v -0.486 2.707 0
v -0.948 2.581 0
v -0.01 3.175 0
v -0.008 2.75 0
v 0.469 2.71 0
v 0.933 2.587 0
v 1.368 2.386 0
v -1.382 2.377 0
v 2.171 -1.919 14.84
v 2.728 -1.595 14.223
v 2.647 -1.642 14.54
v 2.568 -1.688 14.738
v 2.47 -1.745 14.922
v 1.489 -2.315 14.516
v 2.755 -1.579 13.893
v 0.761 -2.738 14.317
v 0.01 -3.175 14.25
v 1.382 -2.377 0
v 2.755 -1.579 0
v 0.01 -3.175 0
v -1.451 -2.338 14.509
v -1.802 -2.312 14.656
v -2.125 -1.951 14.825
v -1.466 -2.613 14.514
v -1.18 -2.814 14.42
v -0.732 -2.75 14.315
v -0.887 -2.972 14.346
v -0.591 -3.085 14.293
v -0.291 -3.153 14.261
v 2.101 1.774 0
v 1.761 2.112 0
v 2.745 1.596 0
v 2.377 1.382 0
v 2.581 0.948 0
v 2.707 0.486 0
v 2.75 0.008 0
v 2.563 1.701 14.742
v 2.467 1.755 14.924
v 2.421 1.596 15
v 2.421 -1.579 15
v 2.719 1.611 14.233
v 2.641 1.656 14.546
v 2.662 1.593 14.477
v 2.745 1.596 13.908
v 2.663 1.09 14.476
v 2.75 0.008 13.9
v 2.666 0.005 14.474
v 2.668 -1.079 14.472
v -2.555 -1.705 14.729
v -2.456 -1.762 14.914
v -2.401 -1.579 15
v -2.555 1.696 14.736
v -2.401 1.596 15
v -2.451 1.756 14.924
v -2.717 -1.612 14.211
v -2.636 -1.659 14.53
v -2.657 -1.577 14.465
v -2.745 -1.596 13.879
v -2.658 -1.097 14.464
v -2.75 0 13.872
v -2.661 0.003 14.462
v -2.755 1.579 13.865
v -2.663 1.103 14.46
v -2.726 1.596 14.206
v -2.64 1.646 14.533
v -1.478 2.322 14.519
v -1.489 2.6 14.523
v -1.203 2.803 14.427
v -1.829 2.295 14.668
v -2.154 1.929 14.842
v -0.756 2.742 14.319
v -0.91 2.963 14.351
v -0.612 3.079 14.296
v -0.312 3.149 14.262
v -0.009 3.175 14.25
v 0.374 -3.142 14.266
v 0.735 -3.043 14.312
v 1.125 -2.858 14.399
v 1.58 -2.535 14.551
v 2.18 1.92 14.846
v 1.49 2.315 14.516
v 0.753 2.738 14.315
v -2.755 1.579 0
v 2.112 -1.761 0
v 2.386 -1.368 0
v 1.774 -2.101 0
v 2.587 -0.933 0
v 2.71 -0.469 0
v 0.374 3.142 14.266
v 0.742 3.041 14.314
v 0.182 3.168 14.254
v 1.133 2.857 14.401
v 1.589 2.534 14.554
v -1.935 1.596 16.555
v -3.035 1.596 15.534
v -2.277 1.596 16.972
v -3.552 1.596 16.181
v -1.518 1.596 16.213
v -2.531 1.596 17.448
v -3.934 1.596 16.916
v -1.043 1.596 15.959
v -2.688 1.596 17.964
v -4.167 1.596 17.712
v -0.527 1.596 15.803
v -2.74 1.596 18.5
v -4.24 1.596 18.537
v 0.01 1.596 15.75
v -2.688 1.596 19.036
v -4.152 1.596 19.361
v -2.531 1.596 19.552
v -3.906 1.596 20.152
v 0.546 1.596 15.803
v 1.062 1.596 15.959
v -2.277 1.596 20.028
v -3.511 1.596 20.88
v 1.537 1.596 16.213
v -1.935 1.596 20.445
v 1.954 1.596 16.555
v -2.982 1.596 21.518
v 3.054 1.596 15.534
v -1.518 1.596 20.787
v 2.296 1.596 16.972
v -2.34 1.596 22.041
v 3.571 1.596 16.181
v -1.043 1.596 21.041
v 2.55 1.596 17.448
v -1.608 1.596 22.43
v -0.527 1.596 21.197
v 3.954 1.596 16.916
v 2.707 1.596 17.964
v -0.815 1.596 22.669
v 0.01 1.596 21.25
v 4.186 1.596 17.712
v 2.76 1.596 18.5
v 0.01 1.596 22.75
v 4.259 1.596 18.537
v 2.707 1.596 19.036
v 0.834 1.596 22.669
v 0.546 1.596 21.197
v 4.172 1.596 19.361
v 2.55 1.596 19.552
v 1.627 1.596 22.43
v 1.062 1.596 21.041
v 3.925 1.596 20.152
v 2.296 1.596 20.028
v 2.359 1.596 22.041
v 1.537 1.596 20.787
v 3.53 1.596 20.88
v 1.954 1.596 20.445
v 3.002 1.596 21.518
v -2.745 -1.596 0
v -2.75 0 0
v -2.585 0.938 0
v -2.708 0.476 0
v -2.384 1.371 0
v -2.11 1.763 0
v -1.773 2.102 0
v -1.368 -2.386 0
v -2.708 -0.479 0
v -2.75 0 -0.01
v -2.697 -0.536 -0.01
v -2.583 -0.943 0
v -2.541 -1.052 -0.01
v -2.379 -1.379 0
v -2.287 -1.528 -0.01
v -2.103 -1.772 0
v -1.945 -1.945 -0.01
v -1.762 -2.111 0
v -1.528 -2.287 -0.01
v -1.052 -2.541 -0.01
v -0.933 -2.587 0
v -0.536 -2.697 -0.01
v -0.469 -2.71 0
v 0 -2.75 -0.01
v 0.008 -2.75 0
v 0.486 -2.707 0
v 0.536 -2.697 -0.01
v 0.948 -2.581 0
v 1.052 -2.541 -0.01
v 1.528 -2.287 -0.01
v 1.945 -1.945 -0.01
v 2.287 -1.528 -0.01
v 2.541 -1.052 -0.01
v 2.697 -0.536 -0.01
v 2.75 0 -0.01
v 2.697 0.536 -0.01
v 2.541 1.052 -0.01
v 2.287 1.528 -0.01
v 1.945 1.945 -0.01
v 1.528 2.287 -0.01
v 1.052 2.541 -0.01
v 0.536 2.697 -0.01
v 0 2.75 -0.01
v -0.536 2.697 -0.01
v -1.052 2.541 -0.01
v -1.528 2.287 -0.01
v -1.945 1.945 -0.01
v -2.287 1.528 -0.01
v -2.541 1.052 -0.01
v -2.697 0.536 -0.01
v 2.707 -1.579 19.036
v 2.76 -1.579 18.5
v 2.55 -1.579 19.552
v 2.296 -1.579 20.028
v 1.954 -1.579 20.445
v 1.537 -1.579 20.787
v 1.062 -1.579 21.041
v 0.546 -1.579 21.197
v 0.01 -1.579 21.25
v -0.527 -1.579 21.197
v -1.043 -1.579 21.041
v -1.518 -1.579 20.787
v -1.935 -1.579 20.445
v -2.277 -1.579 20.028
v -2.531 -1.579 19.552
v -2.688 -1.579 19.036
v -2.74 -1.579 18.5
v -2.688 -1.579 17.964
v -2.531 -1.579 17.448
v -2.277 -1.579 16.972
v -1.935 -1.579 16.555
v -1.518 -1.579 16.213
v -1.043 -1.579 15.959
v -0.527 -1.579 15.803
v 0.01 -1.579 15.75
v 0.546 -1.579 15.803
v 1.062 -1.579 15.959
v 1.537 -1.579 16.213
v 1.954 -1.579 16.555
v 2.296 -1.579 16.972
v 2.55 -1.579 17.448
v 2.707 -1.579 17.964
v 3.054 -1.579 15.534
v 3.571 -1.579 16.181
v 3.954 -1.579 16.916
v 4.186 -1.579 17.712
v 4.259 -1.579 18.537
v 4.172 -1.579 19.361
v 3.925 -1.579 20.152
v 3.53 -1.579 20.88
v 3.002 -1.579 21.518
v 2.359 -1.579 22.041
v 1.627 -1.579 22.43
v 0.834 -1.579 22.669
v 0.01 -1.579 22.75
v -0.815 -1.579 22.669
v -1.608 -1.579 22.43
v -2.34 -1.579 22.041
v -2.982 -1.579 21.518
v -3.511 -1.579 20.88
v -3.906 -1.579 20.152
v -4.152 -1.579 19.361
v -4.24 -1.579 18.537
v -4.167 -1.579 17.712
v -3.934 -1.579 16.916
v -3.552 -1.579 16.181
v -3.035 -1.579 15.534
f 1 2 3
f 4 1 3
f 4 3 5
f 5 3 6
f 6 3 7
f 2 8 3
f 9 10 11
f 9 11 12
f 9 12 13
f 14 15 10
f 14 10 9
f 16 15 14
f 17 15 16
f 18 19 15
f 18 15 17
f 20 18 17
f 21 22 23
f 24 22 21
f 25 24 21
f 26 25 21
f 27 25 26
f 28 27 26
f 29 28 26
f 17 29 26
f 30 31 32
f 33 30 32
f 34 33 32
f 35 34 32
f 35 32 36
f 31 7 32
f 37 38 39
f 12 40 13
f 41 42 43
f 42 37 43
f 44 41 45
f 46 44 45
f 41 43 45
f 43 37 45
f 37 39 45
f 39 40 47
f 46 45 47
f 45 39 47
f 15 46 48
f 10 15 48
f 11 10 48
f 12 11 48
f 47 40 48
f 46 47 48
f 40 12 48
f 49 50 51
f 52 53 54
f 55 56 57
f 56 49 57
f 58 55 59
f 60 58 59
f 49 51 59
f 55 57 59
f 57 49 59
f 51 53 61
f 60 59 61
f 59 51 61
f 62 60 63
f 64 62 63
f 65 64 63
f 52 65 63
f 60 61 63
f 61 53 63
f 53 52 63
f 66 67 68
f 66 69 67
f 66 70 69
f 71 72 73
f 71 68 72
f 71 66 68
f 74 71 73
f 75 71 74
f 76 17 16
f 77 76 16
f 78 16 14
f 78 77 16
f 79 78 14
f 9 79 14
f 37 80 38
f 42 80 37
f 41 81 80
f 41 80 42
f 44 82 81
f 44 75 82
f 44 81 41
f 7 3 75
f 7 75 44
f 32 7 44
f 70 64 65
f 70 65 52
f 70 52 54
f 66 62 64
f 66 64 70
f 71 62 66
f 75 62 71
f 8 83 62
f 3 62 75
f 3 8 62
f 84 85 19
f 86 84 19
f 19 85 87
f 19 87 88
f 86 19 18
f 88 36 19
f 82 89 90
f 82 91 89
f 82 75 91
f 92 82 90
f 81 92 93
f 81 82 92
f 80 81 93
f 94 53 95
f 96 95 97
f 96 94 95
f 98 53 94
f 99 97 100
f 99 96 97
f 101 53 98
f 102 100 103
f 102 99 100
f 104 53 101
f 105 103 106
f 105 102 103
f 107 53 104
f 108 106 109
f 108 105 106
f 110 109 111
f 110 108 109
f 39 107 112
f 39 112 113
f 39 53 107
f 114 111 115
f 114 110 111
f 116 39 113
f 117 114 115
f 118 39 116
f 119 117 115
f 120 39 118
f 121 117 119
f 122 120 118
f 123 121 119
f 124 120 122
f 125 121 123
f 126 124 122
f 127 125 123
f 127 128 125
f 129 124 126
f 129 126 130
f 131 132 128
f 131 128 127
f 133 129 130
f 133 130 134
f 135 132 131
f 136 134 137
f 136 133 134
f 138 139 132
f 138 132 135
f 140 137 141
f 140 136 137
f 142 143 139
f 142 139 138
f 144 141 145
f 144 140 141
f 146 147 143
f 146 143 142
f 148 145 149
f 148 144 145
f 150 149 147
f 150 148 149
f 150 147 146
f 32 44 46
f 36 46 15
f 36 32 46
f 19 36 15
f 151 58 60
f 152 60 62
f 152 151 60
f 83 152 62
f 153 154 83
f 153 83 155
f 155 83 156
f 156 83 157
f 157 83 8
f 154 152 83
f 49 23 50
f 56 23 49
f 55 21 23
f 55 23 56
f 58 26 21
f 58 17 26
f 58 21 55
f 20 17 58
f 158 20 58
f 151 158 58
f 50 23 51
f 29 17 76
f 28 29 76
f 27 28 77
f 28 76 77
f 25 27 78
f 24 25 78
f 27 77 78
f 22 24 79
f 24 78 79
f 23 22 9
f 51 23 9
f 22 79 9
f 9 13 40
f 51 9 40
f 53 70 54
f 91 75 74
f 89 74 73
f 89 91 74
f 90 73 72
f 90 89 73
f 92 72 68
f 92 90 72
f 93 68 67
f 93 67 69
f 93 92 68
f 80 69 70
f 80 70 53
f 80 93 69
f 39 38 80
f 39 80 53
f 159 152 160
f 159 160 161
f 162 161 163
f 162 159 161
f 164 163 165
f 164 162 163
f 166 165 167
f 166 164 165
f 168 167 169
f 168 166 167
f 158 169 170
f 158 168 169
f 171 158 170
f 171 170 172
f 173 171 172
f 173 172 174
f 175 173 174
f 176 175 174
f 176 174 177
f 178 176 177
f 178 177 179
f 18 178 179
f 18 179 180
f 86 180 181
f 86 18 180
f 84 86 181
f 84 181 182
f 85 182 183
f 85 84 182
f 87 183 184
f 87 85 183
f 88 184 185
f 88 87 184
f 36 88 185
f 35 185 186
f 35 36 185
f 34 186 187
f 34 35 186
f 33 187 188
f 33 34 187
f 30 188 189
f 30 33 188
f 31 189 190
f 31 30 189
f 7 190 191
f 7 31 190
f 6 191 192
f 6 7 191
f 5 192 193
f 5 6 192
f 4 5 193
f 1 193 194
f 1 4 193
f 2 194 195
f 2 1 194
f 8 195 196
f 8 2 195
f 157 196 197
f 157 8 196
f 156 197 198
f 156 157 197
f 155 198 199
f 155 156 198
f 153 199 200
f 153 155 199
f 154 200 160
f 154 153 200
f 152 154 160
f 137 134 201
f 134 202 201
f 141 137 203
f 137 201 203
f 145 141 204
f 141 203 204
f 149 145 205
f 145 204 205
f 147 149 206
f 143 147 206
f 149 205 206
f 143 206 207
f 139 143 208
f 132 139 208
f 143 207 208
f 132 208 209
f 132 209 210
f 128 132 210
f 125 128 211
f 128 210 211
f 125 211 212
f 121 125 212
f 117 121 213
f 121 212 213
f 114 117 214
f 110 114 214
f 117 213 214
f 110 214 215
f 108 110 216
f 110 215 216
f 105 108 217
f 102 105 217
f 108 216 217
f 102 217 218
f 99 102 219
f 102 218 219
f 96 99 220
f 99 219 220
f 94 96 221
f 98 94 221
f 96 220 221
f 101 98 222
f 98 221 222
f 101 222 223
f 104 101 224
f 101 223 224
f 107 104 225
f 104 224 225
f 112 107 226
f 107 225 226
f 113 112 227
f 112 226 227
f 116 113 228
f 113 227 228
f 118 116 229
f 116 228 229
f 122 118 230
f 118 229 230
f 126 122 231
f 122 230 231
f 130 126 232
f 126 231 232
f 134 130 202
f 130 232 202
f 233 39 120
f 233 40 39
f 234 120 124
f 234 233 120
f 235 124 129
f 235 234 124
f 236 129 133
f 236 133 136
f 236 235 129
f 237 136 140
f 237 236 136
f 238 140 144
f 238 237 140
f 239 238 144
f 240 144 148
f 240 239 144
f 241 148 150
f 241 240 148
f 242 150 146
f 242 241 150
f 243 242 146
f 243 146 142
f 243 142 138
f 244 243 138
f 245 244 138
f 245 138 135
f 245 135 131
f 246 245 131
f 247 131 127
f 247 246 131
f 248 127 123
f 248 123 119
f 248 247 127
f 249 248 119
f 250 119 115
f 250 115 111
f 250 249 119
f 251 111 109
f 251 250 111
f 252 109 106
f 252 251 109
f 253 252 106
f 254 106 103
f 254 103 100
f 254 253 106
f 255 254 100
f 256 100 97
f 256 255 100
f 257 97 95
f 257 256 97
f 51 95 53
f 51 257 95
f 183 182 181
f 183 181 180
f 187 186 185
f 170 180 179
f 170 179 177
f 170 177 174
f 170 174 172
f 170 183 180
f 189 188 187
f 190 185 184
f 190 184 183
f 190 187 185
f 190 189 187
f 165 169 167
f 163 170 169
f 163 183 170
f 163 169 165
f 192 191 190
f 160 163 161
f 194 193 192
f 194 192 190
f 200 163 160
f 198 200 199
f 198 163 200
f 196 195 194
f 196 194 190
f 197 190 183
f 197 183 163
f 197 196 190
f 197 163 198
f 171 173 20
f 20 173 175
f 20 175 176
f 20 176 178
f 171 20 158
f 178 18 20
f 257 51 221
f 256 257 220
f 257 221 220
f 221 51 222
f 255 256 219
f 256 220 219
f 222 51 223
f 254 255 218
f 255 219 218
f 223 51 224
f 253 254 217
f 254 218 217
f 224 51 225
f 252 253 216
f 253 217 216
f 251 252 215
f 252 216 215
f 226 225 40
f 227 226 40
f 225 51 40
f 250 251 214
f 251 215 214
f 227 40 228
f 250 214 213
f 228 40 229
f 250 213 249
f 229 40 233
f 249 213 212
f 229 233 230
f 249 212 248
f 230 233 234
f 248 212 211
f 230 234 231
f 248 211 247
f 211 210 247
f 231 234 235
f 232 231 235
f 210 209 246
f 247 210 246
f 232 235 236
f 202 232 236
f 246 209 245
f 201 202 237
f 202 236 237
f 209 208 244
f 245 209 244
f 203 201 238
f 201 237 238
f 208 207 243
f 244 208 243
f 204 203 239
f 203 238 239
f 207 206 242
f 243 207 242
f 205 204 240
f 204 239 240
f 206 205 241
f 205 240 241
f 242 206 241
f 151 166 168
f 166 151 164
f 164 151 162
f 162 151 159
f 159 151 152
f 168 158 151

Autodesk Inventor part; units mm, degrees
sketch "Boceto1" plane through (0, 0, 0) normal (0, 0, 1) x (1, 0, 0)
  line L0 (2.7452, 1.596) -> (2.7548, -1.5794)
  line L1 (2.7548, -1.5794) -> (0.0096, -3.1754)
  line L2 (0.0096, -3.1754) -> (-2.7452, -1.596)
  line L3 (-2.7452, -1.596) -> (-2.7548, 1.5794)
  line L4 (-2.7548, 1.5794) -> (-0.0096, 3.1754)
  line L5 (-0.0096, 3.1754) -> (2.7452, 1.596)
  point P0 (0, 0)
  point P1 (0, 0)
  dimension "d0" = 5.5
  dimension "d20" = 6.3508
extrude "Extrusión1" add sketch "Boceto1" along normal blind 15
ref_plane "Plano de trabajo4" through (-2.7452, -1.596, 0) normal (0, 0, -1) x (-1, 0, 0)
sketch "Boceto2" plane through (-2.7452, -1.596, 0) normal (0, 0, -1) x (-1, 0, 0)
  line L0 (-2.7548, -1.5794) -> (1.0358, -1.5794)
  line L1 (1.0358, -1.5794) -> (-2.7548, -1.5794)
  line L2 (-5.6299, -1.5794) -> (-2.7548, -1.5794)
  point P0 (-2.7452, 1.596)
  dimension "d5" = 3.1754
ref_plane "Plano de trabajo5" through (0, -3.175, 0) normal (0, 1, 0) x (-1, 0, 0)
sketch "Boceto3" plane through (0, -3.175, 0) normal (0, 1, 0) x (-1, 0, 0)
  line L0 (-0.0096, 15) -> (-2.7548, 15) projected
  line L1 (2.6199, 14) -> (-2.7548, 14) construction
  line L2 (-0.0096, 0) -> (-0.0096, 15) projected
  line L3 (-0.0096, 14) -> (-0.0096, 18.5)
  circle A0 centre (-0.0096, 18.5) radius 4.25
  circle A1 centre (-0.0096, 18.5) radius 2.75
  point P0 (0, 0)
  dimension "d7" = 1
  dimension "d8" = 4.5
  dimension "d9" = 8.5
  dimension "d14" = 5.5
sketch "Boceto4" plane through (-2.7452, -1.596, 0) normal (0, 0, -1) x (-1, 0, 0)
  point P0 (-2.7452, 1.596)
  point P1 (-2.7356, 4.7714)
  point P2 (-2.7548, -1.579)
  dimension "d10" = 6.3504
extrude "Extrusión2" add sketch "Boceto3" along normal blind 6.35 contours L2 A0 L0 | L0 A0 L2 | A1
ref_plane "Barreno" through (0, 0, 0) normal (0, -1, 0) x (1, 0, 0)
sketch "Boceto6" plane through (0, 0, 0) normal (0, -1, 0) x (1, 0, 0)
  arc A0 (0.0103, 14.25) -> (0.0089, 14.25) centre (0.0096, 18.5) ccw projected
  circle A1 centre (0.0096, 18.5) radius 2.75 projected
  point P0 (0, 0)
  dimension "d13" = 4.25
extrude "Extrusión3" cut sketch "Boceto6" along normal mid plane 10 contours A1
ref_plane "Plano de trabajo8" through (5, 0, 0) normal (1, 0, 0) x (0, 1, 0)
sketch "Boceto8" plane through (5, 0, 0) normal (1, 0, 0) x (0, 1, 0)
  line L0 (-3.175, 15.75) -> (-3.175, 21.25) projected
  line L1 (-3.1754, 14.25) -> (-1.5794, 15)
  line L2 (-1.5794, 15) -> (-1.5794, 22.75)
  line L3 (-1.5794, 22.75) -> (-3.175, 22.75)
  line L4 (3.175, 14.25) -> (1.596, 15)
  line L5 (1.596, 15) -> (1.596, 22.75)
  line L6 (1.596, 22.75) -> (3.175, 22.75)
  ellipse E0 centre (3.1866, 18.5) end of major axis (3.1866, 14.25) minor radius 2.4709 (1.7849, 15) -> (3.175, 14.25) ccw projected
  line L7 (-3.175, 22.75) -> (-6.1952, 22.75)
  line L8 (-6.1952, 22.75) -> (-6.1952, 14.0055)
  line L9 (-6.1952, 14.0055) -> (-3.1754, 14.25)
  line L10 (3.175, 14.25) -> (7.2865, 13.4418)
  line L11 (7.2865, 13.4418) -> (6.5328, 22.75)
  line L12 (6.5328, 22.75) -> (3.175, 22.75)
  point P0 (0, 0)
  point P1 (-1.5794, 15)
extrude "Extrusión4" cut sketch "Boceto8" against normal blind 10 contours L9 L8 L7 L3 L2 L1 | L4 L5 L6 L12 L11 L10
fillet "Empalme1" radius 2 1 edges at (-2.75, 0, 15)
fillet "Empalme2" radius 2 1 edges at (2.75, 0.0083, 15)
ref_plane "Plano de trabajo9" through (0, 0, 0) normal (0, 0, -1) x (-1, 0, 0)
sketch "Boceto9" plane through (0, 0, 0) normal (0, 0, -1) x (-1, 0, 0)
  circle A0 centre (0, 0) radius 2.75
  line L0 (2.7548, 1.5794) -> (2.7452, -1.596) projected
extrude "Extrusión5" add sketch "Boceto9" along normal blind 0.01
properties part number "Cabezal" material "Plástico ABS"
